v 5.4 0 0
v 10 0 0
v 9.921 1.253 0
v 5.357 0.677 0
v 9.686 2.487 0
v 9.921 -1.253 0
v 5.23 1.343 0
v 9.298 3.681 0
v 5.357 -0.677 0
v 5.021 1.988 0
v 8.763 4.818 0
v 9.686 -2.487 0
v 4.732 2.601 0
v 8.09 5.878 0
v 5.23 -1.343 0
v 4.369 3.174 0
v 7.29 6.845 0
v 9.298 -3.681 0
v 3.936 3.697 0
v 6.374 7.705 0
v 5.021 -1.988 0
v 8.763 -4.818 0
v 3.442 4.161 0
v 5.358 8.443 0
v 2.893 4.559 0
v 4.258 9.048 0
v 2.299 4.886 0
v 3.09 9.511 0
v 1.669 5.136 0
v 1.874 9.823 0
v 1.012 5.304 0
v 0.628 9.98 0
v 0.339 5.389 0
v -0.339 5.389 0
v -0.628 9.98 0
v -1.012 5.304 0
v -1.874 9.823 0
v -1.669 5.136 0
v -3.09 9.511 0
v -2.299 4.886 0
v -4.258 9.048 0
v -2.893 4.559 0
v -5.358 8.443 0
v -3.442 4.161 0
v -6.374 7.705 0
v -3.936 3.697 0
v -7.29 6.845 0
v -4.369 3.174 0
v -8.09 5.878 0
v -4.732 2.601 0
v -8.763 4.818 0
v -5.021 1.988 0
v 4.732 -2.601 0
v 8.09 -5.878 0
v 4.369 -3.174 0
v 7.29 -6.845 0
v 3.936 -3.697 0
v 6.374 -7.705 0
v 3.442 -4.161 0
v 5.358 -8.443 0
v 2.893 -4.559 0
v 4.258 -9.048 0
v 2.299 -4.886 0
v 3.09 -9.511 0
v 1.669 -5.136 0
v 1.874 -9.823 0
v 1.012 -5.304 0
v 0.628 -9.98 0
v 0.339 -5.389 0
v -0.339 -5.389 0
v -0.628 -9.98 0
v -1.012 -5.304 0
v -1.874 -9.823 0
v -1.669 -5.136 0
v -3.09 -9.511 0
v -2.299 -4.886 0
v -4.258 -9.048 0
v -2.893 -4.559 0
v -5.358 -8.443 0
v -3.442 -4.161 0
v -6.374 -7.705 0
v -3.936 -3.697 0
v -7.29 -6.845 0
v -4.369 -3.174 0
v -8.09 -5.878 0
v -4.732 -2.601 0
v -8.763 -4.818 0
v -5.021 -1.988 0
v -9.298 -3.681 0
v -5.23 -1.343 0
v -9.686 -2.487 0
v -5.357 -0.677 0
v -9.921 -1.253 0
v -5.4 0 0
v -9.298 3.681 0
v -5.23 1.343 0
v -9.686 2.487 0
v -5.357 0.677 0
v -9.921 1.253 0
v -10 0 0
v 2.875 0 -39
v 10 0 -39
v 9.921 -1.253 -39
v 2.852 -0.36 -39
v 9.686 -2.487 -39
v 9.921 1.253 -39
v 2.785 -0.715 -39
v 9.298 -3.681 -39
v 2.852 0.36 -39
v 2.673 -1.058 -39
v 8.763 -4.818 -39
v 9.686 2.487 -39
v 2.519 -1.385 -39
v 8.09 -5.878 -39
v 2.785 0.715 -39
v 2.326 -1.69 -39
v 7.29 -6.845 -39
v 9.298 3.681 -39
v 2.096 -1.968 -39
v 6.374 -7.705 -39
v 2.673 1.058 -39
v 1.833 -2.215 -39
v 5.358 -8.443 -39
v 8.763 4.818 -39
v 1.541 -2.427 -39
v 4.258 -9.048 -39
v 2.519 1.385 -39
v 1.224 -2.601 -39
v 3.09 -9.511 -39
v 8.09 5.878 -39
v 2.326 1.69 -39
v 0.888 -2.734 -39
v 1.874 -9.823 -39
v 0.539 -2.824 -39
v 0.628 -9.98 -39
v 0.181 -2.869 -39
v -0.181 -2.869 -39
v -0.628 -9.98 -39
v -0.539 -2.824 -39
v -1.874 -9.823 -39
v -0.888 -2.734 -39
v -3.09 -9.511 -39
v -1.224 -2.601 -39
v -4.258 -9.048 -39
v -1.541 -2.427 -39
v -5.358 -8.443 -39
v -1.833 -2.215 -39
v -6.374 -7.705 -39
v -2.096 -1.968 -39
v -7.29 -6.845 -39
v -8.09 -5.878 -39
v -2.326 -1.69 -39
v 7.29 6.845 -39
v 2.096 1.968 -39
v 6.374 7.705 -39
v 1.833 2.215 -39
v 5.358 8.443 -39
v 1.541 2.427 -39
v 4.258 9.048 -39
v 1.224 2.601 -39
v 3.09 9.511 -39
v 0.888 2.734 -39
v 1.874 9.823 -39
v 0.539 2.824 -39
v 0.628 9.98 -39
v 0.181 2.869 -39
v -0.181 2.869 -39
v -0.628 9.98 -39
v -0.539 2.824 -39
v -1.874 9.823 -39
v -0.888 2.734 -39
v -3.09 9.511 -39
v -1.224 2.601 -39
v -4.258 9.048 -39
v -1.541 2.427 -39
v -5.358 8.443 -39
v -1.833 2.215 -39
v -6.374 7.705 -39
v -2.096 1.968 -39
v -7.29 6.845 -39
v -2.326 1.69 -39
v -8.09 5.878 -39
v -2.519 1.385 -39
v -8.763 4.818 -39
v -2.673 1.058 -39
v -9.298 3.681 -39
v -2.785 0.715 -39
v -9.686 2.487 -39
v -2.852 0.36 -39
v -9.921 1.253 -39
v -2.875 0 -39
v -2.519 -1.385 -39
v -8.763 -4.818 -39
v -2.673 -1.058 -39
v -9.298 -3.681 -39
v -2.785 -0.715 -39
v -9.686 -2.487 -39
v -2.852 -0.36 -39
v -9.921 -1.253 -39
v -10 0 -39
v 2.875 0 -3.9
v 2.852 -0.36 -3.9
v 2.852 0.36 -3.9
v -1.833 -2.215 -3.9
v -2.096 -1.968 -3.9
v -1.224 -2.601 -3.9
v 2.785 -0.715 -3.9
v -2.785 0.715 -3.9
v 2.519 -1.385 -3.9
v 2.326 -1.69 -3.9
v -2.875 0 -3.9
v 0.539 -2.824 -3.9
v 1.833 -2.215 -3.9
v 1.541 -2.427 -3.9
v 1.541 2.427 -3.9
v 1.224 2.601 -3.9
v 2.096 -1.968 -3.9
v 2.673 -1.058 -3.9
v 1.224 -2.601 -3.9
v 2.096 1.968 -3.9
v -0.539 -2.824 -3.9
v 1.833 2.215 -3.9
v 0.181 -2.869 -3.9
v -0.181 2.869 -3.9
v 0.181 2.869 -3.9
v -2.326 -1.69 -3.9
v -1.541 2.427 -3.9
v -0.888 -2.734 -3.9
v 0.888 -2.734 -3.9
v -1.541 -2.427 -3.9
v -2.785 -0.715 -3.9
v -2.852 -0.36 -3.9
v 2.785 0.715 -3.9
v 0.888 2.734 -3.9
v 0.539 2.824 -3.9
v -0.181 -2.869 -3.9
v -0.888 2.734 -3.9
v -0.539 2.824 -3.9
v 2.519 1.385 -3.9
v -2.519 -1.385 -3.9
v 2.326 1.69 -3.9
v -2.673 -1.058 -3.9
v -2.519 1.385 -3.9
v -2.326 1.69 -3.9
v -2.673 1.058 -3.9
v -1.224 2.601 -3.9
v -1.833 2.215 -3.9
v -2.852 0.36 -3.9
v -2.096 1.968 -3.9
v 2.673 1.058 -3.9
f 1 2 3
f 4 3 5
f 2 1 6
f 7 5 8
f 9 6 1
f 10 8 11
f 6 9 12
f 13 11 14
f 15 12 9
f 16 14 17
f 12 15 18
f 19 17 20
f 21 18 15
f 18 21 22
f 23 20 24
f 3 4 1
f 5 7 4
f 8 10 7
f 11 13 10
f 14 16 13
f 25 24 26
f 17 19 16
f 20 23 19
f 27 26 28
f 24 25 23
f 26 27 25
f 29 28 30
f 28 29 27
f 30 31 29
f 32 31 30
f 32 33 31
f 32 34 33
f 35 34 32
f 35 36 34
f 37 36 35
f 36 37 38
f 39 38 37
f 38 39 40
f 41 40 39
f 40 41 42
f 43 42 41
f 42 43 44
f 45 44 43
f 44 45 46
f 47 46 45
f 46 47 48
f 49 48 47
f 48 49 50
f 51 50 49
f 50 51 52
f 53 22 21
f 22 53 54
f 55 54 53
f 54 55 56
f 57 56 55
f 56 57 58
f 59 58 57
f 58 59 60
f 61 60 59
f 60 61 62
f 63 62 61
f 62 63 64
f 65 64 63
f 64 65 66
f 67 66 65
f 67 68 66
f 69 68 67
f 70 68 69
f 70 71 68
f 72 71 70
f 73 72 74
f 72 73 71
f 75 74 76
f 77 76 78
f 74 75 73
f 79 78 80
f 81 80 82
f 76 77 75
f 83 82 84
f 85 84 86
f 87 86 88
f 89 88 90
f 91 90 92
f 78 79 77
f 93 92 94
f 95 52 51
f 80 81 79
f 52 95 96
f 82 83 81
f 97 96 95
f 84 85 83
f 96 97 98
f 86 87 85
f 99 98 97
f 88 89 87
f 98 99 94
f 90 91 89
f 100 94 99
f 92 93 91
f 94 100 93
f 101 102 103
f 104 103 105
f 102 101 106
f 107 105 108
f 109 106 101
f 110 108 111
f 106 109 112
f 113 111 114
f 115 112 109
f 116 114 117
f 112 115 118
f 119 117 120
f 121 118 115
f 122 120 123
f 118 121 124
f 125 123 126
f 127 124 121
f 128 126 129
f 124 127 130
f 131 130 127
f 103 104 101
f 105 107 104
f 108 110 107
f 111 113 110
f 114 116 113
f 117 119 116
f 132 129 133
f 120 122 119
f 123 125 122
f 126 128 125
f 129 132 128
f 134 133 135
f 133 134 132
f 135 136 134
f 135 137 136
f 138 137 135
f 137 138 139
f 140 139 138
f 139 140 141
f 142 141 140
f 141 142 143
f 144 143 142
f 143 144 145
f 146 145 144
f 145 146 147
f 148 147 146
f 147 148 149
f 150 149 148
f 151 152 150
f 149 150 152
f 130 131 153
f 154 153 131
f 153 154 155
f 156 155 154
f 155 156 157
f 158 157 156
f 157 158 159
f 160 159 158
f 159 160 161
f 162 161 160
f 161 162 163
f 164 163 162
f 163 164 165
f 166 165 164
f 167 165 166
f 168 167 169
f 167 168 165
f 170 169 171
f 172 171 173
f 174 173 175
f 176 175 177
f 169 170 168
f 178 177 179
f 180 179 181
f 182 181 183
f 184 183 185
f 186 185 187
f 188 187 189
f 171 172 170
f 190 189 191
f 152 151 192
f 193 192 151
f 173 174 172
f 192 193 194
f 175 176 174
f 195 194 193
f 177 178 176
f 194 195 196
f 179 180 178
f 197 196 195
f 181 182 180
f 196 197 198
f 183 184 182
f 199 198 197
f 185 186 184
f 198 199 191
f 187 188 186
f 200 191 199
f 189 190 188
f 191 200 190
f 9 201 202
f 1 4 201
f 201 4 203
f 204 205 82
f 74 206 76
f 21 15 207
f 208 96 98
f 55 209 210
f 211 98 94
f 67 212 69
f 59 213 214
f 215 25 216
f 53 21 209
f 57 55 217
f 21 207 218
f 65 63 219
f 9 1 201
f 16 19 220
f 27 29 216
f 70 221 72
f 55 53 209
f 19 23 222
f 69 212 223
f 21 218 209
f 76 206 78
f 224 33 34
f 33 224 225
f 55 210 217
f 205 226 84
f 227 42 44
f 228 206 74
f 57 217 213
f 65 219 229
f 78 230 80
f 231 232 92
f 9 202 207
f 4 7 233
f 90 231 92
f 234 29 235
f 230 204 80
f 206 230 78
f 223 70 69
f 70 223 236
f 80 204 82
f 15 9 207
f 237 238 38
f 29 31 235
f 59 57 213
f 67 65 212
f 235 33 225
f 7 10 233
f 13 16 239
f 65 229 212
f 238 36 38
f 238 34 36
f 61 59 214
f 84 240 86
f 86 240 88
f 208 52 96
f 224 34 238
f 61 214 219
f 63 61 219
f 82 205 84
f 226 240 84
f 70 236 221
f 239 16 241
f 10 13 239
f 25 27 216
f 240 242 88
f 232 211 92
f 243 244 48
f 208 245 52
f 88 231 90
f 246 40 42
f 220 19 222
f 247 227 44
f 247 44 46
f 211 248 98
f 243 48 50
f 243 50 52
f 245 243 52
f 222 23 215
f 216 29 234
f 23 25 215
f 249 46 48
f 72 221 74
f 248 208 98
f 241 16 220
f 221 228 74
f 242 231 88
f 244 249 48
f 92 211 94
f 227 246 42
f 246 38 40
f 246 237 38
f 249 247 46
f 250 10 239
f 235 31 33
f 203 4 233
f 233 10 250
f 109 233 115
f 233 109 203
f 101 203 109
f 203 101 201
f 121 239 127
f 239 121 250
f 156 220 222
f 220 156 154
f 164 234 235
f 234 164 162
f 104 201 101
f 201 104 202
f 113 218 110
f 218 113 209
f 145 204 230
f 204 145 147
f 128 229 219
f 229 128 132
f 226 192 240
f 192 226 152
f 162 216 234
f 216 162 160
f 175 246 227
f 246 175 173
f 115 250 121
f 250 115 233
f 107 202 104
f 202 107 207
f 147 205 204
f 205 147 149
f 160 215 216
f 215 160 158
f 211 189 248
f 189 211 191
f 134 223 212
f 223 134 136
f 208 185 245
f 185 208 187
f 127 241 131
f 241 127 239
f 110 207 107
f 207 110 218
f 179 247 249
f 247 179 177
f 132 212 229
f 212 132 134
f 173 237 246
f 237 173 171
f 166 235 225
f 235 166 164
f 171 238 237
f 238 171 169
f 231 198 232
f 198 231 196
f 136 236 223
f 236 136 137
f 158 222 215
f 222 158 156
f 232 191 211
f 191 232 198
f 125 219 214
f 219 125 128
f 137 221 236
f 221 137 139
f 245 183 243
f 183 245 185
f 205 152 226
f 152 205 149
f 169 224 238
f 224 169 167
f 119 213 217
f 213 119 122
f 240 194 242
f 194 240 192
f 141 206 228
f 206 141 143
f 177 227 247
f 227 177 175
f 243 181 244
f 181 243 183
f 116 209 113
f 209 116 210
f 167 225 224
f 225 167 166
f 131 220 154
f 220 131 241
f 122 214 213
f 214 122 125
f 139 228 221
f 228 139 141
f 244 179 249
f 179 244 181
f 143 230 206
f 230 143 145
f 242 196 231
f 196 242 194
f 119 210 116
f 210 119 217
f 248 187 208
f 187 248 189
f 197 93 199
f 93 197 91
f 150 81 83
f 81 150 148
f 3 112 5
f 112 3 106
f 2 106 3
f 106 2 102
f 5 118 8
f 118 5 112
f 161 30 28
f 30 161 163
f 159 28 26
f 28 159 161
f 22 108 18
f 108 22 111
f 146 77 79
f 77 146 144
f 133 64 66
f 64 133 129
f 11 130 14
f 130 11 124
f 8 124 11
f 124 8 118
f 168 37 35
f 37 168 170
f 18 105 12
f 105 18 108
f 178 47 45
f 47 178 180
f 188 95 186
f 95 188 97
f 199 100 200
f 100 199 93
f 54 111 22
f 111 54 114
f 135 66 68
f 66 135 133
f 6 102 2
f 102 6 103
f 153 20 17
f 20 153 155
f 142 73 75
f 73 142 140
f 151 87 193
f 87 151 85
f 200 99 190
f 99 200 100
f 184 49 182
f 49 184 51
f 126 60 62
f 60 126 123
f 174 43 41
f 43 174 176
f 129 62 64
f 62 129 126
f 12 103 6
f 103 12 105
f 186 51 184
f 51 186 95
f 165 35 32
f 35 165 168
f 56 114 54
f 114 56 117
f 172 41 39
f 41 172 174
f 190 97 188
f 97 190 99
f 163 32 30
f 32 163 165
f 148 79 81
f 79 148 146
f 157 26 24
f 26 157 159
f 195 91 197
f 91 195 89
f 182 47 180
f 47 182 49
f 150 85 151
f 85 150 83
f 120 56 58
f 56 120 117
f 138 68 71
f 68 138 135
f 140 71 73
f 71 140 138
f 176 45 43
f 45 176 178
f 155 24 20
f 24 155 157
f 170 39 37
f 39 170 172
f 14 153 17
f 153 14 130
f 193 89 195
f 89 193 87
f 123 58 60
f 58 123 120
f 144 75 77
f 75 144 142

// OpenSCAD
$fn = 50;


difference() {
	union() {
		translate(v = [0, 0, -39.0000000000]) {
			cylinder(h = 39, r = 10.0000000000);
		}
		cylinder(h = 0, r = 16.0000000000);
	}
	union() {
		translate(v = [0, 0, 0]) {
			rotate(a = [0, 0, 0]) {
				difference() {
					union() {
						#translate(v = [0, 0, -39.0000000000]) {
							cylinder(h = 39, r = 2.6000000000);
						}
						#translate(v = [0, 0, -3.9000000000]) {
							cylinder(h = 3.9000000000, r1 = 2.8750000000, r2 = 5.4000000000);
						}
						#translate(v = [0, 0, -39.0000000000]) {
							cylinder(h = 39, r = 2.8750000000);
						}
						#translate(v = [0, 0, -39.0000000000]) {
							cylinder(h = 39, r = 2.6000000000);
						}
					}
					union();
				}
			}
		}
	}
}
